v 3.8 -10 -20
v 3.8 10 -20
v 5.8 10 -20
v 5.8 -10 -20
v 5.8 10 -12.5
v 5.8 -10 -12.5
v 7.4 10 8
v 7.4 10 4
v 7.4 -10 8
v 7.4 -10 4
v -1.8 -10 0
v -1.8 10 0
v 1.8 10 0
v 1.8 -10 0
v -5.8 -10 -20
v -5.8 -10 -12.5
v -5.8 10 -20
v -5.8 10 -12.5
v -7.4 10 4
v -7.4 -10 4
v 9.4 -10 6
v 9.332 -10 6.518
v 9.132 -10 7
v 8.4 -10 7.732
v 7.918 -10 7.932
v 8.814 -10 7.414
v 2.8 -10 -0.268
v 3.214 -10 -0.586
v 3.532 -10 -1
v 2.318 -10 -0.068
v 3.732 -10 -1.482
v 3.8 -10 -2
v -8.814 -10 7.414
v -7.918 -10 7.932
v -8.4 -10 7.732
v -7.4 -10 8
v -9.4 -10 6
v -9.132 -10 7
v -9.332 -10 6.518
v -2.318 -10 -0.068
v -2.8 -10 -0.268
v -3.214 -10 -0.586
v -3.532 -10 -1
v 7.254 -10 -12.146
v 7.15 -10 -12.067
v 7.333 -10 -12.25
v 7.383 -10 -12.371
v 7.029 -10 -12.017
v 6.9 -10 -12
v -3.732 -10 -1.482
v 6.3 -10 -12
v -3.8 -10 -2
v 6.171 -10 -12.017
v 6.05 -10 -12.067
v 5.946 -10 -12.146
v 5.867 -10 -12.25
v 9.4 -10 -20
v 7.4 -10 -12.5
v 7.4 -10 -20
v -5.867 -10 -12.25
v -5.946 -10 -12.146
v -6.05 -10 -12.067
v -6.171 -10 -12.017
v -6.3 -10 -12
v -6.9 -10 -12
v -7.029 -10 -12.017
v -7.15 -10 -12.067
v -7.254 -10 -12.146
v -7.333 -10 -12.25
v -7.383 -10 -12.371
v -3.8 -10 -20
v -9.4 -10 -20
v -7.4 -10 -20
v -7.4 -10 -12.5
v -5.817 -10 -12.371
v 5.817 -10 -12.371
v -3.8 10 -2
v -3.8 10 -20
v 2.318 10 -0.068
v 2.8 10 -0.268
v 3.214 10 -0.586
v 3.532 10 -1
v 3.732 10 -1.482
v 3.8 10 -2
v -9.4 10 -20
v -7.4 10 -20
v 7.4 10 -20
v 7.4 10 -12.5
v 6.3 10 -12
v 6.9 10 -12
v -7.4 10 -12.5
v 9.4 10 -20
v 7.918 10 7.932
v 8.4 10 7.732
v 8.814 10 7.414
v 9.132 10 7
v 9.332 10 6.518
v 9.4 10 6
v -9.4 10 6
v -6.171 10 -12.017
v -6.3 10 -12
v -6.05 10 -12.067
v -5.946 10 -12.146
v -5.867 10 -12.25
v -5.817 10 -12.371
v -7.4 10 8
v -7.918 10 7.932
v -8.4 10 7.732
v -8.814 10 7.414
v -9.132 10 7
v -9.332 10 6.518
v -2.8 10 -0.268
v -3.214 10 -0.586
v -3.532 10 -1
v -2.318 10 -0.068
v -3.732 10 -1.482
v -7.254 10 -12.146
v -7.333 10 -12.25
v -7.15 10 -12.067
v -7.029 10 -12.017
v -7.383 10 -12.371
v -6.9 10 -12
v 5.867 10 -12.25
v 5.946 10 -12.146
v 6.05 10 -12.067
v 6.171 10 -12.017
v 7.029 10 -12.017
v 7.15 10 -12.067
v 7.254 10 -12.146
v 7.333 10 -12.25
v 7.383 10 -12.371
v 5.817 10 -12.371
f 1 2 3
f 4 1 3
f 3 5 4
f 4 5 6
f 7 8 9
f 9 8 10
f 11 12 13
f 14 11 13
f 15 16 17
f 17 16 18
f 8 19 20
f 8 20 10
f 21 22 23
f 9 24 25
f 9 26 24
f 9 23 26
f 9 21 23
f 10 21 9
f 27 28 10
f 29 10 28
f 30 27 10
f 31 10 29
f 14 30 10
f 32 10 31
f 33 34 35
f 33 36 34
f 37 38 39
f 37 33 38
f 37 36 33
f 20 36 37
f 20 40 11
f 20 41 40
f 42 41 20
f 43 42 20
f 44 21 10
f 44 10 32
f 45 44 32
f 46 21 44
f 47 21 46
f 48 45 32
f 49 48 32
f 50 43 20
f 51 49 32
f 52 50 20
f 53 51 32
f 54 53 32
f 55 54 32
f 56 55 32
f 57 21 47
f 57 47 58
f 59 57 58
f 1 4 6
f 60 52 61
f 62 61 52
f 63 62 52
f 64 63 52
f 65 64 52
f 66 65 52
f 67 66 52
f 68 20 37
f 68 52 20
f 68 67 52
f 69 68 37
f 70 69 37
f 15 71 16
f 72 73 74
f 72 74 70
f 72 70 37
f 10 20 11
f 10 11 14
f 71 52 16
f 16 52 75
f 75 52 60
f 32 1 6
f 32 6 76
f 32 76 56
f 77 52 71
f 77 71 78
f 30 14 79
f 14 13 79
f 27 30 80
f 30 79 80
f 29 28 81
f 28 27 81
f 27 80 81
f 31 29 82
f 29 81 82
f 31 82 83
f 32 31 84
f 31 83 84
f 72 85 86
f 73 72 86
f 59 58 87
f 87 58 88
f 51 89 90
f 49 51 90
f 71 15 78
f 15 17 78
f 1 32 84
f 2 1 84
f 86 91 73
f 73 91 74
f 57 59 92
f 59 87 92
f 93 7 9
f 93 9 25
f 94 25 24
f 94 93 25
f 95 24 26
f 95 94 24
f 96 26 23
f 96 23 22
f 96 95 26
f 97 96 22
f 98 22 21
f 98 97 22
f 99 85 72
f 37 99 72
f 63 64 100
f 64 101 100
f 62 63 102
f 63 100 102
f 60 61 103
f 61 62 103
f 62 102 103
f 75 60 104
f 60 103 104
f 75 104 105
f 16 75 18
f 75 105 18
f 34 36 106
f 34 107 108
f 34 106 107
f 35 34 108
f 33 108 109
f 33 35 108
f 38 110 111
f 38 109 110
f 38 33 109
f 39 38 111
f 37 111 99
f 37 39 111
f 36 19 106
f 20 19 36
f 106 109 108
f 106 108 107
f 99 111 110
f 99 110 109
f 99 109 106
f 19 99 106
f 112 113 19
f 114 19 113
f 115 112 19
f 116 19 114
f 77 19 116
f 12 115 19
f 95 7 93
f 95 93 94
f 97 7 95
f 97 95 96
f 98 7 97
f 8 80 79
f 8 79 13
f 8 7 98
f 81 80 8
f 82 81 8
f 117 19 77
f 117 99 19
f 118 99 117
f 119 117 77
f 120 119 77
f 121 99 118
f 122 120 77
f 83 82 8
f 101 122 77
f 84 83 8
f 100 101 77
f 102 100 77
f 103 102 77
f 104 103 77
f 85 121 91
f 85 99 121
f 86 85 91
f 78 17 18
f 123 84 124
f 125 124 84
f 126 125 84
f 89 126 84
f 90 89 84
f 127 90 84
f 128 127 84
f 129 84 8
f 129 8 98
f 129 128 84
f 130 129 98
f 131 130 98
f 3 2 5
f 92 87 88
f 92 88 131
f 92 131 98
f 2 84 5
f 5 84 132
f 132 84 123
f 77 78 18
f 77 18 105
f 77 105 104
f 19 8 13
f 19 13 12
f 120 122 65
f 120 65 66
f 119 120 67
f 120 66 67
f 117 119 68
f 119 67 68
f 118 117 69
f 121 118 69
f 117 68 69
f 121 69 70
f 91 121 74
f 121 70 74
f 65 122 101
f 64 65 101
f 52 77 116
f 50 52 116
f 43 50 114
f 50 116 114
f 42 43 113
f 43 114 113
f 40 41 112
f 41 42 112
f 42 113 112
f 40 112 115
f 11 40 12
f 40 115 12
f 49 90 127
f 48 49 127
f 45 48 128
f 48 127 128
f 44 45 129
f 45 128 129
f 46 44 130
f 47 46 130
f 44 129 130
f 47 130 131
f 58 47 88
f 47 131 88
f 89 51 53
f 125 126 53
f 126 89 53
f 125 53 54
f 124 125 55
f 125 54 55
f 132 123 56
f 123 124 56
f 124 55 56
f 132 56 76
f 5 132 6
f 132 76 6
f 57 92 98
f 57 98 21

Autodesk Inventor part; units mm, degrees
ref_plane "YZ Plane" through (0, 0, 0) normal (1, 0, 0) x (0, 1, 0)
ref_plane "XZ Plane" through (0, 0, 0) normal (0, 1, 0) x (-1, 0, 0)
ref_plane "XY Plane" through (0, 0, 0) normal (0, 0, 1) x (1, 0, 0)
sketch "Schizzo1" plane through (0, 0, 0) normal (0, 0, 1) x (1, 0, 0)
  line L0 (-5.8, 10) -> (5.8, 10)
  line L1 (5.8, 10) -> (5.8, -10)
  line L2 (5.8, -10) -> (-5.8, -10)
  line L3 (-5.8, -10) -> (-5.8, 10)
  line L4 (-5.8, 10) -> (-7.4, 10)
  line L5 (-7.4, 10) -> (-7.4, -10)
  line L6 (-7.4, -10) -> (-5.8, -10)
  line L7 (-5.8, -10) -> (-5.8, 10)
  line L8 (0, 10) -> (0, -10) construction
  line L9 (-7.4, 10) -> (-9.4, 10)
  line L10 (-9.4, 10) -> (-9.4, -10)
  line L11 (-9.4, -10) -> (-7.4, -10)
  line L12 (-7.4, -10) -> (-7.4, 10)
  line L13 (-5.8, 0) -> (5.8, 0) construction
  line L14 (5.8, 10) -> (7.4, 10)
  line L15 (7.4, -10) -> (5.8, -10)
  line L16 (7.4, 10) -> (9.4, 10)
  line L17 (9.4, 10) -> (9.4, -10)
  line L18 (9.4, -10) -> (7.4, -10)
  line L19 (7.4, -10) -> (7.4, 10)
  line L20 (-3.8, -10) -> (-3.8, 10)
  line L21 (3.8, -10) -> (3.8, 10)
  point P0 (0, 0)
  point P1 (0, 0)
  point P2 (-5.8, -10)
  point P3 (-7.4, -10)
  point P4 (5.8, -10)
  point P5 (7.4, -10)
  point P6 (-5.8, -10)
  dimension "d1" = 20
  dimension "d2" = 1.6
  dimension "d3" = 2
  dimension "d6" = 2
  dimension "d7" = 2
  dimension "d20" = 7.6
extrude "Estrusione1" add sketch "Schizzo1" along normal blind 4
extrude "Estrusione2" add sketch "Schizzo1" against normal blind 20 contours L0 L20 L2 L3 | L5 L11 L10 L9 | L0 L1 L2 L21 | L16 L17 L18 L19
extrude "Estrusione3" add sketch "Schizzo1" against normal blind 12 contours L3 L6 L5 L4 | L14 L19 L15 L1
fillet "Raccordo1" radius 2 2 edges at (-3.8, 0, 0) (3.8, 0, 0)
sketch "Schizzo3" plane through (0, 0, 4) normal (0, 0, 1) x (1, 0, 0)
  line L0 (-9.4, 10) -> (-9.4, -10) projected
  line L1 (-9.4, -10) -> (9.4, -10) projected
  line L2 (-9.4, 10) -> (-7.4, 10)
  line L3 (-7.4, 10) -> (-7.4, -10)
  line L4 (-7.4, -10) -> (-9.4, -10)
  line L5 (-9.4, -10) -> (-9.4, 10)
  line L6 (9.4, 10) -> (7.4, 10)
  line L7 (7.4, 10) -> (7.4, -10)
  line L8 (7.4, -10) -> (9.4, -10)
  line L9 (9.4, -10) -> (9.4, 10)
  line L10 (9.4, -10) -> (9.4, 10) projected
  point P0 (0, 0)
  point P1 (9.4, 0)
  dimension "d16" = 2
  dimension "d17" = 2
extrude "Estrusione5" add sketch "Schizzo3" along normal blind 4
fillet "Raccordo3" radius 0.5 4 edges at (7.4, 0, -12) (5.8, 0, -12) (-7.4, 0, -12) (-5.8, 0, -12)
fillet "Raccordo4" radius 2 2 edges at (9.4, 0, 8) (-9.4, 0, 8)
properties part number "Sensore intermedio"
